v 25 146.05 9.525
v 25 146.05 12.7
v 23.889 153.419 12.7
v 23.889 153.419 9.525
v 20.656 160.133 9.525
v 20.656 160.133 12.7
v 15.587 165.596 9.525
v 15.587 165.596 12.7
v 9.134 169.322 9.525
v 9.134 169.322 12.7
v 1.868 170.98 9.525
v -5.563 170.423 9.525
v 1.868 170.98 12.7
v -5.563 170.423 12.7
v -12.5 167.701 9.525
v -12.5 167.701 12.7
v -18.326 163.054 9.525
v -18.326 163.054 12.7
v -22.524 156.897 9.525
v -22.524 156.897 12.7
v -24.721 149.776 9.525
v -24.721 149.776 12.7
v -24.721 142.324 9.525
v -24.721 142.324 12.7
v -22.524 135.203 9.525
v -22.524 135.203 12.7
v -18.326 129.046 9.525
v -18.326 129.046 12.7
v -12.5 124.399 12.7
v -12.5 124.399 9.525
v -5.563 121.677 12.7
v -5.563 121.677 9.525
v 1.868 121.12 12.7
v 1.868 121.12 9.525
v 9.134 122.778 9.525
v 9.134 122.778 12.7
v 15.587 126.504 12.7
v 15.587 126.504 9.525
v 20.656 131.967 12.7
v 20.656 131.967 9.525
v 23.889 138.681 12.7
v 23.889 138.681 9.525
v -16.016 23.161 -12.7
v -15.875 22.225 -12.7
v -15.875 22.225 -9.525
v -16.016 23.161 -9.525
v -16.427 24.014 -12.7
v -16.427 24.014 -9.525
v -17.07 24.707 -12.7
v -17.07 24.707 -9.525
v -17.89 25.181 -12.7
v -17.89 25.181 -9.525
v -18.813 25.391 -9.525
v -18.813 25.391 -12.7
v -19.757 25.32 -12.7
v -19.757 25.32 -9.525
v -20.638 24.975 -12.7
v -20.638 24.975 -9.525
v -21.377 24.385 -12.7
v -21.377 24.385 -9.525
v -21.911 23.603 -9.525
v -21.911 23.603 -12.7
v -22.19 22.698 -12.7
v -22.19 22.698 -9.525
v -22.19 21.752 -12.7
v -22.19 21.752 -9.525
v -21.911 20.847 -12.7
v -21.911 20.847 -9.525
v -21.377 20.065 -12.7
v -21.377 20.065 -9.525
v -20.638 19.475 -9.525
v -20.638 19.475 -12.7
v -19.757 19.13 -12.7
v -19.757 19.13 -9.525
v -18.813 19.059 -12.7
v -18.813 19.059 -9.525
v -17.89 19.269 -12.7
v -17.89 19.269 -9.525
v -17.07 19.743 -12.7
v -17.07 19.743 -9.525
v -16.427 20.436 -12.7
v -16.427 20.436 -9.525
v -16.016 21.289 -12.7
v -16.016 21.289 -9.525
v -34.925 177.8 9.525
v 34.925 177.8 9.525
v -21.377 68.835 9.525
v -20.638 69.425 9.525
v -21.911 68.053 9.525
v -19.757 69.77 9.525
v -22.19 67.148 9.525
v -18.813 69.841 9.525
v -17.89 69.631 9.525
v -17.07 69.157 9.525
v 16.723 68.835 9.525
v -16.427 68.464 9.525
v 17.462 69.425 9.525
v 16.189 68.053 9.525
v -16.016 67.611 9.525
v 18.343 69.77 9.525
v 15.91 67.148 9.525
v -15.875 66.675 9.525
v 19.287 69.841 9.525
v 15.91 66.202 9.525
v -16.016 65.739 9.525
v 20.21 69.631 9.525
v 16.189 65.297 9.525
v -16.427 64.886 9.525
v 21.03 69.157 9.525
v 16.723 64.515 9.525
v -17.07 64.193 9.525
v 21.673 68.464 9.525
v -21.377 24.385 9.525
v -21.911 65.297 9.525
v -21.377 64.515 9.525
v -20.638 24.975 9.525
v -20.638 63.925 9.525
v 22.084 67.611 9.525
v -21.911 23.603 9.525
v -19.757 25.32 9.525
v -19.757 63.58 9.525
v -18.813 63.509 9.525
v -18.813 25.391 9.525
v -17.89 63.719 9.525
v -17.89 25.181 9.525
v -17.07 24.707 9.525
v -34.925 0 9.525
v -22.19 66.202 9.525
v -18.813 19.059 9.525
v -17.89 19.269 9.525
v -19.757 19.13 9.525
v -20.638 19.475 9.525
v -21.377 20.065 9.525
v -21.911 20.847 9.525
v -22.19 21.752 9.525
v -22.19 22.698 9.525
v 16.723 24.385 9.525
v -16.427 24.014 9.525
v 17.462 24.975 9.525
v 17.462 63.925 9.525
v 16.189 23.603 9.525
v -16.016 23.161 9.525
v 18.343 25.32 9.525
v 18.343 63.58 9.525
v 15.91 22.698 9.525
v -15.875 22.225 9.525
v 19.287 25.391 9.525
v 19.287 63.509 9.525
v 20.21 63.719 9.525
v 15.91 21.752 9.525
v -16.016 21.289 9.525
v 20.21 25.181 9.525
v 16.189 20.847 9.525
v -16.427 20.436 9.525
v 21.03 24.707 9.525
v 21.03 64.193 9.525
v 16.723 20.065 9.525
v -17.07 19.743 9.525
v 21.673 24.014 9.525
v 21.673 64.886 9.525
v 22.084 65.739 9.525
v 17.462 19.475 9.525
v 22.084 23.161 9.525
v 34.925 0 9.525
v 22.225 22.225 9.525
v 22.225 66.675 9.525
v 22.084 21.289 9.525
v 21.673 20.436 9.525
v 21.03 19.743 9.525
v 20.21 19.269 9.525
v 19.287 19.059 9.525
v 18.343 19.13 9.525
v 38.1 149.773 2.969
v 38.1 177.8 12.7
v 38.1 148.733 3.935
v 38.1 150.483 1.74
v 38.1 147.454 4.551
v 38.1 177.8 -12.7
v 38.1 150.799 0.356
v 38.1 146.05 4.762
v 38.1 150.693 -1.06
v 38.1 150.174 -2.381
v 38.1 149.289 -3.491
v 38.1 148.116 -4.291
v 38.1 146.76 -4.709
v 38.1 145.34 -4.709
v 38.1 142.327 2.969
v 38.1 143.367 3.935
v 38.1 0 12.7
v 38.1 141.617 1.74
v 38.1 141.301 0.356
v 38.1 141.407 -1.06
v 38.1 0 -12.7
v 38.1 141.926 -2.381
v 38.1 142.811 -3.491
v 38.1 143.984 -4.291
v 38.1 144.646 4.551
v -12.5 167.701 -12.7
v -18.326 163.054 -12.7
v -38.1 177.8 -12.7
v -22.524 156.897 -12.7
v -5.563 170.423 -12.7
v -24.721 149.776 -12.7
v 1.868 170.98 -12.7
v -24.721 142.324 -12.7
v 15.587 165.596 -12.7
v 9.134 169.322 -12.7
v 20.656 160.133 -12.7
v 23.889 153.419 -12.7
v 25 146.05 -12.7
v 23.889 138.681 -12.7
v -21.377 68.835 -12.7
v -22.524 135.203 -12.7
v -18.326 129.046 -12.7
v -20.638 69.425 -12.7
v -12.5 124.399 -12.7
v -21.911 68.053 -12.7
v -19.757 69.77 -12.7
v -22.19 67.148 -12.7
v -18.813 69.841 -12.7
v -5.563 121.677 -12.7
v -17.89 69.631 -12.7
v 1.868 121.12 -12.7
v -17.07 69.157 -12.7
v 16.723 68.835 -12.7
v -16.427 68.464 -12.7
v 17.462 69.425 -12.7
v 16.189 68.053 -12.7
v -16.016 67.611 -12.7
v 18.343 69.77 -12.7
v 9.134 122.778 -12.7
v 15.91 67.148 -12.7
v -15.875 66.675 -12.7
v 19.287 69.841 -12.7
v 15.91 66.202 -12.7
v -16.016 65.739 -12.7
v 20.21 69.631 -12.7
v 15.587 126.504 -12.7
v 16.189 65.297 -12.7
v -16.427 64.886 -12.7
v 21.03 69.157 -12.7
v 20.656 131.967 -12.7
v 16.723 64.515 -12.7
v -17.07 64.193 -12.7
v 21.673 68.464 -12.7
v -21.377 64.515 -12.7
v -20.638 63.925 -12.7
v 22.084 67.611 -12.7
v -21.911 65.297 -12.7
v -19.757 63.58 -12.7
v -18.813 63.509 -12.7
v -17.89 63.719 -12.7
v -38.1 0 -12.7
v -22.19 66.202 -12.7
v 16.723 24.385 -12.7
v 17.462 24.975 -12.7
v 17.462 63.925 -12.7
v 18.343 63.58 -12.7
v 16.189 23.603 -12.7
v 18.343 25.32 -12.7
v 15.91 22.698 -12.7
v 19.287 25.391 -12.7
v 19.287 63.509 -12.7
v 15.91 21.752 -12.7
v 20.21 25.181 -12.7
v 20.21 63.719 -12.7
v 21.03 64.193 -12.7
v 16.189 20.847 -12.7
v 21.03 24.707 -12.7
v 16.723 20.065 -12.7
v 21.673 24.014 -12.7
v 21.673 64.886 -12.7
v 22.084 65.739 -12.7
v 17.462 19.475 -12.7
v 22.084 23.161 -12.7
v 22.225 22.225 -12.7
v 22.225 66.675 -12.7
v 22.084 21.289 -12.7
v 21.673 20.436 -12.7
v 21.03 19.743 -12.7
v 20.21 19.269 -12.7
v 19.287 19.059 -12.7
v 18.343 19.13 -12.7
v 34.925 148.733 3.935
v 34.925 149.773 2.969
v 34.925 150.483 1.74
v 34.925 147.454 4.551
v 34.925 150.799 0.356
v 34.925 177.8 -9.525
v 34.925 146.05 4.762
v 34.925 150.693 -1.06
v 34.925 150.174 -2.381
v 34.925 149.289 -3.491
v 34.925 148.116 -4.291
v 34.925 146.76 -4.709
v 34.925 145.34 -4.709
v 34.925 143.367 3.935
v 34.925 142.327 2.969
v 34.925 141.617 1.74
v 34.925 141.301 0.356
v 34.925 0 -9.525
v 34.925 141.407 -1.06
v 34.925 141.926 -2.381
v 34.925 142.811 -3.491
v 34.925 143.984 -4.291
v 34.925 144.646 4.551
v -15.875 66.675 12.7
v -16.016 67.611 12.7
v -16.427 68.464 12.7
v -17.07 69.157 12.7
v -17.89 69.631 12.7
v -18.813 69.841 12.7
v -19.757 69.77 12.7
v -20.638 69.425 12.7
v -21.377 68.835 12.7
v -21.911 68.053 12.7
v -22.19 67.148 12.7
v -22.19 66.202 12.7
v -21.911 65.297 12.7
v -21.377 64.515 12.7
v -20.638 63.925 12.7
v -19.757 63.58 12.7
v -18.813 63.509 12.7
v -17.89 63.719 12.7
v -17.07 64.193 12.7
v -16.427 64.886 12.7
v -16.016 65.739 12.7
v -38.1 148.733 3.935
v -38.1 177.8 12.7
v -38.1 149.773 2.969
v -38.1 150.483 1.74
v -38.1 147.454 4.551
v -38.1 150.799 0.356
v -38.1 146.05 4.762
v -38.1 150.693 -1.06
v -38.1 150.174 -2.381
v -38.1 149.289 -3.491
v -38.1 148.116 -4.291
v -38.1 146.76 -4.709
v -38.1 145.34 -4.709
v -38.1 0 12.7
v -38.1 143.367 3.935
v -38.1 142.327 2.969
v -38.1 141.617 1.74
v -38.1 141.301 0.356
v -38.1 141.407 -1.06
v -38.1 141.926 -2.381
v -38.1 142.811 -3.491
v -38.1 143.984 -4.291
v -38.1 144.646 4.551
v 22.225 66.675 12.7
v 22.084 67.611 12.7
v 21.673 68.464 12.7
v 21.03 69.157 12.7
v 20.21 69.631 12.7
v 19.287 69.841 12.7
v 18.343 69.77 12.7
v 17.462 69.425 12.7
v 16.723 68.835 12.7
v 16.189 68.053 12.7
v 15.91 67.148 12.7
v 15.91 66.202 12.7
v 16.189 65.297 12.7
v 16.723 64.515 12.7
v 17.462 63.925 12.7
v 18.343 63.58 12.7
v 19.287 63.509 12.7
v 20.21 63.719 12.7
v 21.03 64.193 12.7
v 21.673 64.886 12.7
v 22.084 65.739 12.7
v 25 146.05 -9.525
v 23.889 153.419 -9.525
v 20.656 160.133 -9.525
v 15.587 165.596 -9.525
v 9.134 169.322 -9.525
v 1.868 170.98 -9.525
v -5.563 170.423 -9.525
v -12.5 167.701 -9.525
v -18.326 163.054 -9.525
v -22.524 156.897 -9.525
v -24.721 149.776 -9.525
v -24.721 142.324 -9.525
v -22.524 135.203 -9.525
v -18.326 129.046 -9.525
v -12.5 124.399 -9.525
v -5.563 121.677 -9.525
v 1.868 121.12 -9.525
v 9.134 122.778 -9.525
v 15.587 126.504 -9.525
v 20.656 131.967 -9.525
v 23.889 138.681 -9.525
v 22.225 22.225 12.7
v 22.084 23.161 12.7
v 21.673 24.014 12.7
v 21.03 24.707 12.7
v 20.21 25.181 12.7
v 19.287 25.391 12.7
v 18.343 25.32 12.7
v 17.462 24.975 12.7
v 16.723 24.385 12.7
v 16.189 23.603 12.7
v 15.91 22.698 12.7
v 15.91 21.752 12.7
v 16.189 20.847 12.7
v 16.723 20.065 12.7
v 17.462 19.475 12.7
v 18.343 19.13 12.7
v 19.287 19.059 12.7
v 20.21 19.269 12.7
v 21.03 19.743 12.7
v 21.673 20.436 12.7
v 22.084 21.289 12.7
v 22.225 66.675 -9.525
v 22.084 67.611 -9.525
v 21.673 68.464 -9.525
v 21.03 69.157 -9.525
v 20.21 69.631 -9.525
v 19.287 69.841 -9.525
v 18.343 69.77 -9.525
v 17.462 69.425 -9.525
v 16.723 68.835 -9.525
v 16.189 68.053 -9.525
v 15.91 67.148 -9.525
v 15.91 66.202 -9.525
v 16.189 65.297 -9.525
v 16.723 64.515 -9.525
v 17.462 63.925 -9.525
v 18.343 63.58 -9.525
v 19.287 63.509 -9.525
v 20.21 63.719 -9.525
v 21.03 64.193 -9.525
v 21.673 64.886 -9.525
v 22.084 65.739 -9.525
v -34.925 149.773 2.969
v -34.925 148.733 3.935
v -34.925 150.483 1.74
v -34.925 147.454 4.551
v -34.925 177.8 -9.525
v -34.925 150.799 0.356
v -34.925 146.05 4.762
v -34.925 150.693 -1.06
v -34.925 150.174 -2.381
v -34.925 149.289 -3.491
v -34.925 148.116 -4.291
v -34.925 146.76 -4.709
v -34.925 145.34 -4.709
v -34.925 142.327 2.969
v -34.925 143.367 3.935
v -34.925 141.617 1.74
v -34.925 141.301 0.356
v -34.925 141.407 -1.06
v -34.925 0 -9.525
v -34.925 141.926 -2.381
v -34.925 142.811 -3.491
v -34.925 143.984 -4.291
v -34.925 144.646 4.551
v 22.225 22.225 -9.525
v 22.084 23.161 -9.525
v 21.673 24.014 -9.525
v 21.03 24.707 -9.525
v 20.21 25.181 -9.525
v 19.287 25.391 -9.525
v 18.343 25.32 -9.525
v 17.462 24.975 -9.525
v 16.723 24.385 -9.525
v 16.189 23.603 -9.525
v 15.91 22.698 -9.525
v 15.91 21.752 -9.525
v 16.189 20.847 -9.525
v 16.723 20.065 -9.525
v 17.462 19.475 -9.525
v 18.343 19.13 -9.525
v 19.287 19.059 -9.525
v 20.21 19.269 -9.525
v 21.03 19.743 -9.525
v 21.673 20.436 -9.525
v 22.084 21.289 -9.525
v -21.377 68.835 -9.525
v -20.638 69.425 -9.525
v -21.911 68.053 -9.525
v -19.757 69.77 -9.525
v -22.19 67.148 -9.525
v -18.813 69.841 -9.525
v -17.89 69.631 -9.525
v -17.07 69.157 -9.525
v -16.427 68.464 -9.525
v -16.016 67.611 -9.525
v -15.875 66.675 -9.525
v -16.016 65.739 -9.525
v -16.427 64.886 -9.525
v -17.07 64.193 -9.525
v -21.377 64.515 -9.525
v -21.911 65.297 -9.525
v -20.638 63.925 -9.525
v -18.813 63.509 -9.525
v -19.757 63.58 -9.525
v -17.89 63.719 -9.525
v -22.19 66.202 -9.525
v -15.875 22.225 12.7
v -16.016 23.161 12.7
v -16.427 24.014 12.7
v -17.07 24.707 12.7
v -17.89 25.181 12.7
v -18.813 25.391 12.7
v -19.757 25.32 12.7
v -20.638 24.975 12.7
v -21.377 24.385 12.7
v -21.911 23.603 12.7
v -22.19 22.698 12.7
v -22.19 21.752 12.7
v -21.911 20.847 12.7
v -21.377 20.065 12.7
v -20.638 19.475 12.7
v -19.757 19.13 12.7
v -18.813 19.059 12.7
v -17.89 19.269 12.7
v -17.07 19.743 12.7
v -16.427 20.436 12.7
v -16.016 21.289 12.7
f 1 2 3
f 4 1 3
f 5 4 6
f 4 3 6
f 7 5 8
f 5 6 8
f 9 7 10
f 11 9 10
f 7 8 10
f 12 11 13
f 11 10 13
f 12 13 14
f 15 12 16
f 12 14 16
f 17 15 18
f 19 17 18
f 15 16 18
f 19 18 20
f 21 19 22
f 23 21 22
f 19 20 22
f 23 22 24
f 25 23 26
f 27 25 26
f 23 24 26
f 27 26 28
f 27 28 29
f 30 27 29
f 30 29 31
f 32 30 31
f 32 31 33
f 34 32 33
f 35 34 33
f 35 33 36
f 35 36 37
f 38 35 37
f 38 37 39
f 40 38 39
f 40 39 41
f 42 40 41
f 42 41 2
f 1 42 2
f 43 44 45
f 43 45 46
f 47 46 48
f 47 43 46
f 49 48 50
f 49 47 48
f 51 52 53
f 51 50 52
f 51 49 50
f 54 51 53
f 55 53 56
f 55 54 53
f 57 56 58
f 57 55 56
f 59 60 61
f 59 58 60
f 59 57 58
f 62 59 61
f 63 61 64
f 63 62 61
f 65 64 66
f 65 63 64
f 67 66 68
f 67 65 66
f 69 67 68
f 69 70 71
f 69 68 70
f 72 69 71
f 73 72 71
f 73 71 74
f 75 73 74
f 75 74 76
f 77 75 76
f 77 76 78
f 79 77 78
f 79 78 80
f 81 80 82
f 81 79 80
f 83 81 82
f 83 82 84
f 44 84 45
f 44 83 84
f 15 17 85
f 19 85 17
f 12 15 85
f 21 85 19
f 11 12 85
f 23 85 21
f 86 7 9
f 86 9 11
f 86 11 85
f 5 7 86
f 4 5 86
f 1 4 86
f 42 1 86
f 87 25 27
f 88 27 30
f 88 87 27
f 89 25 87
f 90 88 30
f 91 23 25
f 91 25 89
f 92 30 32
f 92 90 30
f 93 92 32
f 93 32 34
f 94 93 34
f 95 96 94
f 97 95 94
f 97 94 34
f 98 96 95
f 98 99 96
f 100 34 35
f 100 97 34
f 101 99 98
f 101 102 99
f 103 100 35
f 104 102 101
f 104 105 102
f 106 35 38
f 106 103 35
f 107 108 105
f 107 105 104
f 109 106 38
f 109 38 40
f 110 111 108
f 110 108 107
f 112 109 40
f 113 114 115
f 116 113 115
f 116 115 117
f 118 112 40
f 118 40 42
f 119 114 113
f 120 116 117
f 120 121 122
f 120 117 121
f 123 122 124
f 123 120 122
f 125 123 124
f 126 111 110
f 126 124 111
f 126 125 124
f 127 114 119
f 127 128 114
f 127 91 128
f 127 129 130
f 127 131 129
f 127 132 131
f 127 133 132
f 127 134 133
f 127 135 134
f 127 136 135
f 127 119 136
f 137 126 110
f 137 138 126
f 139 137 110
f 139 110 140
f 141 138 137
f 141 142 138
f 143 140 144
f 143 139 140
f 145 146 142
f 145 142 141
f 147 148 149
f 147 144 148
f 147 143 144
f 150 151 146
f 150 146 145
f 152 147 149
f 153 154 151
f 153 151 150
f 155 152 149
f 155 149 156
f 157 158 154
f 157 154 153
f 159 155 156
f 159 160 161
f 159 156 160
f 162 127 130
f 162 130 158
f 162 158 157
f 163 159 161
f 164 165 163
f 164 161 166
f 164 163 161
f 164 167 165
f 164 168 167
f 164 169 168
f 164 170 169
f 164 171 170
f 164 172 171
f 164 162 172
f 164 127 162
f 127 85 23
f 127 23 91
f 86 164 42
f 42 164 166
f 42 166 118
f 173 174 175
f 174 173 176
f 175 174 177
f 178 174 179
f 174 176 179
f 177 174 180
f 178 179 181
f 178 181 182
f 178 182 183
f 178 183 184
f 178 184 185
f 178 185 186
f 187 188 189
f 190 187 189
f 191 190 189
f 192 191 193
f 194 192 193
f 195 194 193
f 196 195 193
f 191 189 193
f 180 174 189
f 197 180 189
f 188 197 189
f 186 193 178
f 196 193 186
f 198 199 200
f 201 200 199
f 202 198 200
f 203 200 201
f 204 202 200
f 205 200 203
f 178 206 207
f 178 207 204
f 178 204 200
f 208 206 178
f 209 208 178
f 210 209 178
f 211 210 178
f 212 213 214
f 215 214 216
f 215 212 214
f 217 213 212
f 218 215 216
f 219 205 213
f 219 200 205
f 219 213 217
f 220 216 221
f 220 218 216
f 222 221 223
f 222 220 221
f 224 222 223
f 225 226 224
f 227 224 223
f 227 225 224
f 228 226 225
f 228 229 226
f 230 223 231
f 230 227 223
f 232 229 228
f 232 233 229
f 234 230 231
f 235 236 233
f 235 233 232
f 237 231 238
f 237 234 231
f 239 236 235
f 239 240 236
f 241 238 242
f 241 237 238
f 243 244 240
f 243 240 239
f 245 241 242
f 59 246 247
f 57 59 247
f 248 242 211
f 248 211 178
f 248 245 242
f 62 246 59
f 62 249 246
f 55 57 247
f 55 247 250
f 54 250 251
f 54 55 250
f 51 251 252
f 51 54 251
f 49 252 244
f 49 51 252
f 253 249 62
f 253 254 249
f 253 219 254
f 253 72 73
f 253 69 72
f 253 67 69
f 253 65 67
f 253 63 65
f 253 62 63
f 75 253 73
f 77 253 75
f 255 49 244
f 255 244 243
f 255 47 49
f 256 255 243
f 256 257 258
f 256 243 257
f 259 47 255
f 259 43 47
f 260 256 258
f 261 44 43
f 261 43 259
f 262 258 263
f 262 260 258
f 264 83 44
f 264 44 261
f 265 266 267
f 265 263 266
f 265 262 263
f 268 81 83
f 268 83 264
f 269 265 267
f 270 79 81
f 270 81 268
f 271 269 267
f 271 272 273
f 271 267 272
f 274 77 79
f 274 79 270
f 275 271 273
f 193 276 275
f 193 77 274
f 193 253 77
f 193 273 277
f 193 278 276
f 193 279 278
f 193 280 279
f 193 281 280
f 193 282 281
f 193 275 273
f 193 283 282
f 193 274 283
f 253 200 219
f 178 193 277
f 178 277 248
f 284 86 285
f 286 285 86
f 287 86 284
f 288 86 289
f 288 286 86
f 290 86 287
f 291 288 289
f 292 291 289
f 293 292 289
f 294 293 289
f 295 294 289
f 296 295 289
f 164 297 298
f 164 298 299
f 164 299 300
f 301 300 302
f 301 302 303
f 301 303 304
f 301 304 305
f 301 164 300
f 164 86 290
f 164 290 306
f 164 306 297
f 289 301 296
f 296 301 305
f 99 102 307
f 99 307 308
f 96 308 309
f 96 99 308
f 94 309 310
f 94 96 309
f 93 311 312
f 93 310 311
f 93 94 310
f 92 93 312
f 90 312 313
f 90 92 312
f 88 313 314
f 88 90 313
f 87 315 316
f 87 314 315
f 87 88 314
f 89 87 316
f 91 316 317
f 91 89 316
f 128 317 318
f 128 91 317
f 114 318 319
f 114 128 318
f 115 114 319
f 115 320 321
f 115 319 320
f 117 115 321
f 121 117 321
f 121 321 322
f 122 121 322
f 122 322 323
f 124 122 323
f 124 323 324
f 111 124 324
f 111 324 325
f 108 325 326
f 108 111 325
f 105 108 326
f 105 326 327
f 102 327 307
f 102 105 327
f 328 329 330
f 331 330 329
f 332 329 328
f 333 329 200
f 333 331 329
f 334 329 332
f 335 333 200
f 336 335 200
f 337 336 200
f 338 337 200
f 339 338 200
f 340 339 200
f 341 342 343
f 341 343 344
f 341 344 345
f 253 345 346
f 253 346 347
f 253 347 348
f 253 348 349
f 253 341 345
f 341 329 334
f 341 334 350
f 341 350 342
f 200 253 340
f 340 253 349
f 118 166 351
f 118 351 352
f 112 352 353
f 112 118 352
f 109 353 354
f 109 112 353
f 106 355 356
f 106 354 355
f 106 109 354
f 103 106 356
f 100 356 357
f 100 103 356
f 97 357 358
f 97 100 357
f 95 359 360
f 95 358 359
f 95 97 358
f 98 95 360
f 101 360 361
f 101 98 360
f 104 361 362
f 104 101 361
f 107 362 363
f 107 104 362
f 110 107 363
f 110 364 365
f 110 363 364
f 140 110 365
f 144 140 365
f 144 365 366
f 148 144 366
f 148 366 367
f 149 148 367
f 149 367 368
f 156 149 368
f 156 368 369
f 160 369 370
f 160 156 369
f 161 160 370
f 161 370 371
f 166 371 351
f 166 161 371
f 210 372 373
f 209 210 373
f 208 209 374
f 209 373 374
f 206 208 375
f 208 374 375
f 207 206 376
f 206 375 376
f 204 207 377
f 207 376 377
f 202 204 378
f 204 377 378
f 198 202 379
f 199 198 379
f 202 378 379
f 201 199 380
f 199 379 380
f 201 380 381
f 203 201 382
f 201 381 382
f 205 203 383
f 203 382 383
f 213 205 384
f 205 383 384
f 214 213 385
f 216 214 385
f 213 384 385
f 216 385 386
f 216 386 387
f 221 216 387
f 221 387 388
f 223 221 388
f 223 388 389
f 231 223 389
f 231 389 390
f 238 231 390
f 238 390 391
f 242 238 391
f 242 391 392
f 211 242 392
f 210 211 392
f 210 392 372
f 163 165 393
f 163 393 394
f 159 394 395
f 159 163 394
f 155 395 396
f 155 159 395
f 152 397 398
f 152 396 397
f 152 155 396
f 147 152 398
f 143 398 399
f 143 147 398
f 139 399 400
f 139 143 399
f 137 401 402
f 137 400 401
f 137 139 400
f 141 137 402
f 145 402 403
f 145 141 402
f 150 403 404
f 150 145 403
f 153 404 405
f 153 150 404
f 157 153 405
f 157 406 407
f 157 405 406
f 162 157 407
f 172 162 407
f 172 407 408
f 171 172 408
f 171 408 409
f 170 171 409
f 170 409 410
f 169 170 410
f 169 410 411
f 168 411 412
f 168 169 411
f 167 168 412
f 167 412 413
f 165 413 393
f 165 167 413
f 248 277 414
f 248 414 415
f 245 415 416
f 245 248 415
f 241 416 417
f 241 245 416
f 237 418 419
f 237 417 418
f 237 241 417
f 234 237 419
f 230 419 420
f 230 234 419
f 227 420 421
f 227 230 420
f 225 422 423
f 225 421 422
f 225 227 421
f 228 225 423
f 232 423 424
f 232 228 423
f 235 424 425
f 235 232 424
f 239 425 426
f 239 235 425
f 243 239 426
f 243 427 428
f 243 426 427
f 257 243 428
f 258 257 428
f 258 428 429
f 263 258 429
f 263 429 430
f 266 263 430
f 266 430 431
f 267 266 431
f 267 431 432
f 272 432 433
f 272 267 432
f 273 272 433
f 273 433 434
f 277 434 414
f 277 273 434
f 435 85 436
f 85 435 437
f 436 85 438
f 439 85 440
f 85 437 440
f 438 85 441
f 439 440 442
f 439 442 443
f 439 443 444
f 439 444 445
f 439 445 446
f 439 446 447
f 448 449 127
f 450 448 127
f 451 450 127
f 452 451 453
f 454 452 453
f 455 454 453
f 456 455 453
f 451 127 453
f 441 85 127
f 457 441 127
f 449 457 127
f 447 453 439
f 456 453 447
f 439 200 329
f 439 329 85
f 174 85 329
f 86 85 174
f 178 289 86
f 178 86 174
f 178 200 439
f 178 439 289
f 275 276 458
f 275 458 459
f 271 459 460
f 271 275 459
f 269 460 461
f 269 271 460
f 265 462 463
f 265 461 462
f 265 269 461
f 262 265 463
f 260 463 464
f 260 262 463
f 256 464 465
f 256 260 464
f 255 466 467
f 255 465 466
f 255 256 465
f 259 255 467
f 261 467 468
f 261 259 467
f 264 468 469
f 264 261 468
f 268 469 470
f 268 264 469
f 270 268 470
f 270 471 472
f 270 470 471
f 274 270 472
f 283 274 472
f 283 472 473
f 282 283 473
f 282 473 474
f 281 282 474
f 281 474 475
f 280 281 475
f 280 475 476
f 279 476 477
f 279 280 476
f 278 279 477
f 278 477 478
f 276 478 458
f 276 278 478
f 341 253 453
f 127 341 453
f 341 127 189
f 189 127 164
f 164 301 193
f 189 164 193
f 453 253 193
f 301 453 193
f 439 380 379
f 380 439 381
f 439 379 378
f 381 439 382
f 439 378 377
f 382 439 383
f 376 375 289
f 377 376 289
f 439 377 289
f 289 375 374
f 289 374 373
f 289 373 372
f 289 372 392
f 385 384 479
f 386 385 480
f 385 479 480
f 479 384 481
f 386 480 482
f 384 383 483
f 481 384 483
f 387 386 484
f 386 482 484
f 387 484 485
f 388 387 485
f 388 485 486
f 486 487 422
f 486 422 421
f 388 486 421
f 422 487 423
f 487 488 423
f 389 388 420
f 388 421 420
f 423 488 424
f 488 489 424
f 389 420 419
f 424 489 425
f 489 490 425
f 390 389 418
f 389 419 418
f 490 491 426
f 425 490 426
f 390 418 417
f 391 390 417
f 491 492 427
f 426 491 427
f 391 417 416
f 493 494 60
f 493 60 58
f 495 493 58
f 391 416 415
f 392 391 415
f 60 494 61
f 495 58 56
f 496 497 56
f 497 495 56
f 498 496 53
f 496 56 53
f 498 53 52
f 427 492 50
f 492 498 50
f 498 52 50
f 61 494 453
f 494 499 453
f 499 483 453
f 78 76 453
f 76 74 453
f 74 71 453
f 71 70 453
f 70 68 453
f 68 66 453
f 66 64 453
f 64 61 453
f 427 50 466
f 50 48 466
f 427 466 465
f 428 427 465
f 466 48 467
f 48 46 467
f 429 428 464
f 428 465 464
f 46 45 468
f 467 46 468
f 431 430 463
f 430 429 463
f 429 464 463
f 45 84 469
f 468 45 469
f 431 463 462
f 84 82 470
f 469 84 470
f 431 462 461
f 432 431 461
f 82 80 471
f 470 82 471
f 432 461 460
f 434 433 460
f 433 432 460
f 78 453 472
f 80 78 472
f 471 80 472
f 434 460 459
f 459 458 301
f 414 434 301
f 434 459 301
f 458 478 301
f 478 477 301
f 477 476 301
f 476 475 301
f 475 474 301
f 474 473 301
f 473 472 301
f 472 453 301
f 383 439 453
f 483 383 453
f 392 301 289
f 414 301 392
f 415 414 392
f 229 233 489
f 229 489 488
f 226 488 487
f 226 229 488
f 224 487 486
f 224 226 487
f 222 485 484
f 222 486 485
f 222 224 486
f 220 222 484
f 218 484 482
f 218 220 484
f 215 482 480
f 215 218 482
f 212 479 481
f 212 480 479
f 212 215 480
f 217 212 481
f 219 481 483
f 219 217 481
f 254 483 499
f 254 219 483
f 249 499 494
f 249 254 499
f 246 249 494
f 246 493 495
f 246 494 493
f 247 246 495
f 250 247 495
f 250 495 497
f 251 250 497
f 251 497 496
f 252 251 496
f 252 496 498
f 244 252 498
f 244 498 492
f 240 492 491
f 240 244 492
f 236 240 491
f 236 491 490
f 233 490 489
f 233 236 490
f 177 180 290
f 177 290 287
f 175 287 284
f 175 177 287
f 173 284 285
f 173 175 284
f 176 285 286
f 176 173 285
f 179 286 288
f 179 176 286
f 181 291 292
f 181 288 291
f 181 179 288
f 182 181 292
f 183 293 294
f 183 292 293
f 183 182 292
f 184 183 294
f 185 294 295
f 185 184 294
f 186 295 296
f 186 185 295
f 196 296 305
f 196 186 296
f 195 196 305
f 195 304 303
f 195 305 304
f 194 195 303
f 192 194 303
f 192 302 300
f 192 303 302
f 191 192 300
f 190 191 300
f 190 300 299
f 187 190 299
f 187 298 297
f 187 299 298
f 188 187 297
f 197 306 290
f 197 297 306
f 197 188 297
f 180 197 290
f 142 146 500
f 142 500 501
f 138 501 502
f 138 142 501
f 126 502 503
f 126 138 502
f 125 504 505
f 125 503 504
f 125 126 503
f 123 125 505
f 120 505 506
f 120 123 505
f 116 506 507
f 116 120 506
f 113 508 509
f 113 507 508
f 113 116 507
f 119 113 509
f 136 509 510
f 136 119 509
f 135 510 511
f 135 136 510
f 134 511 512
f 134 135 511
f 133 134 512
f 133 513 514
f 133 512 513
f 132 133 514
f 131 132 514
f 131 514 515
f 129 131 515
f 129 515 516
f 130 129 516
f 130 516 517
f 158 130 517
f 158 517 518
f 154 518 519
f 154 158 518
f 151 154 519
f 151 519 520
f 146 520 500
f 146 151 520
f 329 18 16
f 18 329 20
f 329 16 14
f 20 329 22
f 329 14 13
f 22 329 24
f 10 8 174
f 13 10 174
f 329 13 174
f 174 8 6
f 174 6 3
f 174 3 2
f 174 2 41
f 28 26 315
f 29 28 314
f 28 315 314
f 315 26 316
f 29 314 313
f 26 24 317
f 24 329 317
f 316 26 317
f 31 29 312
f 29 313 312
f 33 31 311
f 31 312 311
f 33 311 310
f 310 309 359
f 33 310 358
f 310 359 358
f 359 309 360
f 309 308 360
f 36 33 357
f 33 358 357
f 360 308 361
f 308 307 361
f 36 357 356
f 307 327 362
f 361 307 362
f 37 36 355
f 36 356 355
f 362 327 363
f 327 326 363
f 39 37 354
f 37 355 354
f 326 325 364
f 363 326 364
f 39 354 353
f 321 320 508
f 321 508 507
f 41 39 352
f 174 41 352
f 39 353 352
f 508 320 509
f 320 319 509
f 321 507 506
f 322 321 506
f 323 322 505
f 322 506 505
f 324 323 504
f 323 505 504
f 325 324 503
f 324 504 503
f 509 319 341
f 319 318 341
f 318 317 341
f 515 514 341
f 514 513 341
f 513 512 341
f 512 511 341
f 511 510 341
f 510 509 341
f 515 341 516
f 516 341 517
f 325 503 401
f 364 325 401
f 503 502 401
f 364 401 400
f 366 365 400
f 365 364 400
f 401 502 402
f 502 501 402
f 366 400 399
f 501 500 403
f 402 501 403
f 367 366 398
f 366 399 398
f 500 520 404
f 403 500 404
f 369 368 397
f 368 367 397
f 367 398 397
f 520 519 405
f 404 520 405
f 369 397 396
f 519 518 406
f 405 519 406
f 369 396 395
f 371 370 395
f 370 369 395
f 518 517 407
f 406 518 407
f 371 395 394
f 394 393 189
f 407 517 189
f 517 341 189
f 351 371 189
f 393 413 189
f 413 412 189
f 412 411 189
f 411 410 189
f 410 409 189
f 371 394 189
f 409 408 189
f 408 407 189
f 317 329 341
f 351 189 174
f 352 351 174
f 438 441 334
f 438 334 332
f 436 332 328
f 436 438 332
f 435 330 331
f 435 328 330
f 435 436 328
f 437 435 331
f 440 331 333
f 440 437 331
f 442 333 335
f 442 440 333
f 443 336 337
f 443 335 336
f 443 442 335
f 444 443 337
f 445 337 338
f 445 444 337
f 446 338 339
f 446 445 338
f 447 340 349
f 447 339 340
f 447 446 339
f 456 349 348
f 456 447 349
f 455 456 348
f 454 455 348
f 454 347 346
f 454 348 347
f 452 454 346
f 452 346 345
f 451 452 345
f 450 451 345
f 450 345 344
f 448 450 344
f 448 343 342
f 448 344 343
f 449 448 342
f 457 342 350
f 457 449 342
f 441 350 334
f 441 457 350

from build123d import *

# Parameters (mm, degrees)
SKETCH1_W               = 76.2
SKETCH1_H               = 25.4
SKETCH1_W_2             = 69.85
SKETCH1_H_2             = 19.05
BOSS_EXTRUDE1_DEPTH     = 177.8
SKETCH2_R               = 25
CUT_EXTRUDE1_DEPTH      = 184.601770144
CUT_EXTRUDE2_DEPTH      = 194.857086535
CUT_EXTRUDE2_DEPTH_BACK = 194.857086535
SKETCH3_R               = 4.7625
CUT_EXTRUDE3_DEPTH      = 184.601770144
CUT_EXTRUDE3_DEPTH_BACK = 184.601770144
SKETCH4_R               = 3.175


with BuildPart() as part:
    # Sketch1 → Boss-Extrude1 (new body)
    with BuildSketch(Plane(origin=(0, 0, 0), x_dir=(1, 0, 0), z_dir=(0, 1, 0))):
        Rectangle(SKETCH1_W, SKETCH1_H)
        Rectangle(SKETCH1_W_2, SKETCH1_H_2, mode=Mode.SUBTRACT)
    extrude(amount=BOSS_EXTRUDE1_DEPTH)

    # Sketch2 → Cut-Extrude1 (cut, through all)
    with BuildSketch(Plane.XY.offset(12.7)):
        with Locations((0, 146.05)):
            Circle(SKETCH2_R)
    extrude(amount=-CUT_EXTRUDE1_DEPTH, mode=Mode.SUBTRACT)

    # Sketch3 → Cut-Extrude2 (cut, two sides: drawn at the far end of the back side and taken through both)
    with BuildSketch(Plane.ZY.offset(38.1).offset(-CUT_EXTRUDE2_DEPTH_BACK)):
        with Locations((0, 146.05)):
            Circle(SKETCH3_R)
    extrude(amount=CUT_EXTRUDE2_DEPTH + CUT_EXTRUDE2_DEPTH_BACK, mode=Mode.SUBTRACT)

    # Sketch4 → Cut-Extrude3 (cut, two sides: drawn at the far end of the back side and taken through both)
    with BuildSketch(Plane.XY.offset(12.7).offset(-CUT_EXTRUDE3_DEPTH_BACK)):
        with Locations((-19.05, 66.675)):
            Circle(SKETCH4_R)
        with Locations((19.05, 66.675)):
            Circle(SKETCH4_R)
        with Locations((19.05, 22.225)):
            Circle(SKETCH4_R)
        with Locations((-19.05, 22.225)):
            Circle(SKETCH4_R)
    extrude(amount=CUT_EXTRUDE3_DEPTH + CUT_EXTRUDE3_DEPTH_BACK, mode=Mode.SUBTRACT)


solid = part.part
